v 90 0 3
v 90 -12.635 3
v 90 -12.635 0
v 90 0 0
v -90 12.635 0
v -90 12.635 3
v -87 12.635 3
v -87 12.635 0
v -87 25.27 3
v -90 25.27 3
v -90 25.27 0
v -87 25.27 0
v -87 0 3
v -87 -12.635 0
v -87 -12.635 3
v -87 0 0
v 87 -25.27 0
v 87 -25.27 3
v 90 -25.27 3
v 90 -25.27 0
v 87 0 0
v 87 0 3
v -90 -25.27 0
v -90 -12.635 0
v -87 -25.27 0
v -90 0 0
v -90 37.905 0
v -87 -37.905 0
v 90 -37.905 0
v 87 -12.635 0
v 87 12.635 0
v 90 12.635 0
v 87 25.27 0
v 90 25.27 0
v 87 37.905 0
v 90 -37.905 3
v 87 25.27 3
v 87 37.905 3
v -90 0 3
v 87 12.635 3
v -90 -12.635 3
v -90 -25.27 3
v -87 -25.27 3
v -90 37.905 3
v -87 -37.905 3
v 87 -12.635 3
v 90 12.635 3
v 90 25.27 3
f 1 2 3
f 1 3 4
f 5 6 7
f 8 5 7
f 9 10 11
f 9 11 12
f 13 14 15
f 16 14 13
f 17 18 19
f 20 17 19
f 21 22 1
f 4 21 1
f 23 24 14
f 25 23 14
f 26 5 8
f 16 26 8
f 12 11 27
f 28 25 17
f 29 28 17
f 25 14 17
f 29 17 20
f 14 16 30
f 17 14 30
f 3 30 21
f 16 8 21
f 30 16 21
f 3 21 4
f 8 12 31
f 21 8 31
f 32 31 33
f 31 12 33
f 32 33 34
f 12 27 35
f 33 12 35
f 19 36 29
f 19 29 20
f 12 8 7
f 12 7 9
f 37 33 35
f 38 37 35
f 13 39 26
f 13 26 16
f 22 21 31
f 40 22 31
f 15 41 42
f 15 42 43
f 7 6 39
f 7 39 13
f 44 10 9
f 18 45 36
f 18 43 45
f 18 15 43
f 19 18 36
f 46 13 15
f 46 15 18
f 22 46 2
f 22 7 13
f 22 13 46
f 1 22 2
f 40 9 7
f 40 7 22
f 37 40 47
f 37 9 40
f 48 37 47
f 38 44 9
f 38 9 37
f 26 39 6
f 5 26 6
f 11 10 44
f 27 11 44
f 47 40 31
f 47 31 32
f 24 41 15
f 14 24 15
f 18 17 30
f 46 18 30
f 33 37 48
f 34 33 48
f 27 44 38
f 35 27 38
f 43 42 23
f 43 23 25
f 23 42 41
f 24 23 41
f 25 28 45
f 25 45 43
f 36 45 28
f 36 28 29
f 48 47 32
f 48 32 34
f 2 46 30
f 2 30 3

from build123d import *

# Parameters (mm, degrees)
ESBO_O1_W                = 174
ESBO_O1_H                = 75.81
RESSALTO_EXTRUS_O1_DEPTH = 3
ESBO_O3_W                = 3
ESBO_O3_H                = 12.635
RESSALTO_EXTRUS_O2_DEPTH = 3
ESBO_O4_W                = 3
ESBO_O4_H                = 12.635
RESSALTO_EXTRUS_O3_DEPTH = 3


with BuildPart() as part:
    # Esboço1 → Ressalto-extrusão1 (new body)
    with BuildSketch(Plane.XY):
        Rectangle(ESBO_O1_W, ESBO_O1_H)
    extrude(amount=RESSALTO_EXTRUS_O1_DEPTH)

    # Esboço3 → Ressalto-extrusão2 (add)
    with BuildSketch(Plane.XY.offset(3)):
        with Locations((-88.5, 6.3175)):
            Rectangle(ESBO_O3_W, ESBO_O3_H)
        with Locations((-88.5, 31.5875)):
            Rectangle(ESBO_O3_W, ESBO_O3_H)
        with Locations((-88.5, -18.9525)):
            Rectangle(ESBO_O3_W, ESBO_O3_H)
    extrude(amount=-RESSALTO_EXTRUS_O2_DEPTH)

    # Esboço4 → Ressalto-extrusão3 (add)
    with BuildSketch(Plane.XY.offset(3)):
        with Locations((88.5, 18.9525)):
            Rectangle(ESBO_O4_W, ESBO_O4_H)
        with Locations((88.5, -6.3175)):
            Rectangle(ESBO_O4_W, ESBO_O4_H)
        with Locations((88.5, -31.5875)):
            Rectangle(ESBO_O4_W, ESBO_O4_H)
    extrude(amount=-RESSALTO_EXTRUS_O3_DEPTH)


solid = part.part
